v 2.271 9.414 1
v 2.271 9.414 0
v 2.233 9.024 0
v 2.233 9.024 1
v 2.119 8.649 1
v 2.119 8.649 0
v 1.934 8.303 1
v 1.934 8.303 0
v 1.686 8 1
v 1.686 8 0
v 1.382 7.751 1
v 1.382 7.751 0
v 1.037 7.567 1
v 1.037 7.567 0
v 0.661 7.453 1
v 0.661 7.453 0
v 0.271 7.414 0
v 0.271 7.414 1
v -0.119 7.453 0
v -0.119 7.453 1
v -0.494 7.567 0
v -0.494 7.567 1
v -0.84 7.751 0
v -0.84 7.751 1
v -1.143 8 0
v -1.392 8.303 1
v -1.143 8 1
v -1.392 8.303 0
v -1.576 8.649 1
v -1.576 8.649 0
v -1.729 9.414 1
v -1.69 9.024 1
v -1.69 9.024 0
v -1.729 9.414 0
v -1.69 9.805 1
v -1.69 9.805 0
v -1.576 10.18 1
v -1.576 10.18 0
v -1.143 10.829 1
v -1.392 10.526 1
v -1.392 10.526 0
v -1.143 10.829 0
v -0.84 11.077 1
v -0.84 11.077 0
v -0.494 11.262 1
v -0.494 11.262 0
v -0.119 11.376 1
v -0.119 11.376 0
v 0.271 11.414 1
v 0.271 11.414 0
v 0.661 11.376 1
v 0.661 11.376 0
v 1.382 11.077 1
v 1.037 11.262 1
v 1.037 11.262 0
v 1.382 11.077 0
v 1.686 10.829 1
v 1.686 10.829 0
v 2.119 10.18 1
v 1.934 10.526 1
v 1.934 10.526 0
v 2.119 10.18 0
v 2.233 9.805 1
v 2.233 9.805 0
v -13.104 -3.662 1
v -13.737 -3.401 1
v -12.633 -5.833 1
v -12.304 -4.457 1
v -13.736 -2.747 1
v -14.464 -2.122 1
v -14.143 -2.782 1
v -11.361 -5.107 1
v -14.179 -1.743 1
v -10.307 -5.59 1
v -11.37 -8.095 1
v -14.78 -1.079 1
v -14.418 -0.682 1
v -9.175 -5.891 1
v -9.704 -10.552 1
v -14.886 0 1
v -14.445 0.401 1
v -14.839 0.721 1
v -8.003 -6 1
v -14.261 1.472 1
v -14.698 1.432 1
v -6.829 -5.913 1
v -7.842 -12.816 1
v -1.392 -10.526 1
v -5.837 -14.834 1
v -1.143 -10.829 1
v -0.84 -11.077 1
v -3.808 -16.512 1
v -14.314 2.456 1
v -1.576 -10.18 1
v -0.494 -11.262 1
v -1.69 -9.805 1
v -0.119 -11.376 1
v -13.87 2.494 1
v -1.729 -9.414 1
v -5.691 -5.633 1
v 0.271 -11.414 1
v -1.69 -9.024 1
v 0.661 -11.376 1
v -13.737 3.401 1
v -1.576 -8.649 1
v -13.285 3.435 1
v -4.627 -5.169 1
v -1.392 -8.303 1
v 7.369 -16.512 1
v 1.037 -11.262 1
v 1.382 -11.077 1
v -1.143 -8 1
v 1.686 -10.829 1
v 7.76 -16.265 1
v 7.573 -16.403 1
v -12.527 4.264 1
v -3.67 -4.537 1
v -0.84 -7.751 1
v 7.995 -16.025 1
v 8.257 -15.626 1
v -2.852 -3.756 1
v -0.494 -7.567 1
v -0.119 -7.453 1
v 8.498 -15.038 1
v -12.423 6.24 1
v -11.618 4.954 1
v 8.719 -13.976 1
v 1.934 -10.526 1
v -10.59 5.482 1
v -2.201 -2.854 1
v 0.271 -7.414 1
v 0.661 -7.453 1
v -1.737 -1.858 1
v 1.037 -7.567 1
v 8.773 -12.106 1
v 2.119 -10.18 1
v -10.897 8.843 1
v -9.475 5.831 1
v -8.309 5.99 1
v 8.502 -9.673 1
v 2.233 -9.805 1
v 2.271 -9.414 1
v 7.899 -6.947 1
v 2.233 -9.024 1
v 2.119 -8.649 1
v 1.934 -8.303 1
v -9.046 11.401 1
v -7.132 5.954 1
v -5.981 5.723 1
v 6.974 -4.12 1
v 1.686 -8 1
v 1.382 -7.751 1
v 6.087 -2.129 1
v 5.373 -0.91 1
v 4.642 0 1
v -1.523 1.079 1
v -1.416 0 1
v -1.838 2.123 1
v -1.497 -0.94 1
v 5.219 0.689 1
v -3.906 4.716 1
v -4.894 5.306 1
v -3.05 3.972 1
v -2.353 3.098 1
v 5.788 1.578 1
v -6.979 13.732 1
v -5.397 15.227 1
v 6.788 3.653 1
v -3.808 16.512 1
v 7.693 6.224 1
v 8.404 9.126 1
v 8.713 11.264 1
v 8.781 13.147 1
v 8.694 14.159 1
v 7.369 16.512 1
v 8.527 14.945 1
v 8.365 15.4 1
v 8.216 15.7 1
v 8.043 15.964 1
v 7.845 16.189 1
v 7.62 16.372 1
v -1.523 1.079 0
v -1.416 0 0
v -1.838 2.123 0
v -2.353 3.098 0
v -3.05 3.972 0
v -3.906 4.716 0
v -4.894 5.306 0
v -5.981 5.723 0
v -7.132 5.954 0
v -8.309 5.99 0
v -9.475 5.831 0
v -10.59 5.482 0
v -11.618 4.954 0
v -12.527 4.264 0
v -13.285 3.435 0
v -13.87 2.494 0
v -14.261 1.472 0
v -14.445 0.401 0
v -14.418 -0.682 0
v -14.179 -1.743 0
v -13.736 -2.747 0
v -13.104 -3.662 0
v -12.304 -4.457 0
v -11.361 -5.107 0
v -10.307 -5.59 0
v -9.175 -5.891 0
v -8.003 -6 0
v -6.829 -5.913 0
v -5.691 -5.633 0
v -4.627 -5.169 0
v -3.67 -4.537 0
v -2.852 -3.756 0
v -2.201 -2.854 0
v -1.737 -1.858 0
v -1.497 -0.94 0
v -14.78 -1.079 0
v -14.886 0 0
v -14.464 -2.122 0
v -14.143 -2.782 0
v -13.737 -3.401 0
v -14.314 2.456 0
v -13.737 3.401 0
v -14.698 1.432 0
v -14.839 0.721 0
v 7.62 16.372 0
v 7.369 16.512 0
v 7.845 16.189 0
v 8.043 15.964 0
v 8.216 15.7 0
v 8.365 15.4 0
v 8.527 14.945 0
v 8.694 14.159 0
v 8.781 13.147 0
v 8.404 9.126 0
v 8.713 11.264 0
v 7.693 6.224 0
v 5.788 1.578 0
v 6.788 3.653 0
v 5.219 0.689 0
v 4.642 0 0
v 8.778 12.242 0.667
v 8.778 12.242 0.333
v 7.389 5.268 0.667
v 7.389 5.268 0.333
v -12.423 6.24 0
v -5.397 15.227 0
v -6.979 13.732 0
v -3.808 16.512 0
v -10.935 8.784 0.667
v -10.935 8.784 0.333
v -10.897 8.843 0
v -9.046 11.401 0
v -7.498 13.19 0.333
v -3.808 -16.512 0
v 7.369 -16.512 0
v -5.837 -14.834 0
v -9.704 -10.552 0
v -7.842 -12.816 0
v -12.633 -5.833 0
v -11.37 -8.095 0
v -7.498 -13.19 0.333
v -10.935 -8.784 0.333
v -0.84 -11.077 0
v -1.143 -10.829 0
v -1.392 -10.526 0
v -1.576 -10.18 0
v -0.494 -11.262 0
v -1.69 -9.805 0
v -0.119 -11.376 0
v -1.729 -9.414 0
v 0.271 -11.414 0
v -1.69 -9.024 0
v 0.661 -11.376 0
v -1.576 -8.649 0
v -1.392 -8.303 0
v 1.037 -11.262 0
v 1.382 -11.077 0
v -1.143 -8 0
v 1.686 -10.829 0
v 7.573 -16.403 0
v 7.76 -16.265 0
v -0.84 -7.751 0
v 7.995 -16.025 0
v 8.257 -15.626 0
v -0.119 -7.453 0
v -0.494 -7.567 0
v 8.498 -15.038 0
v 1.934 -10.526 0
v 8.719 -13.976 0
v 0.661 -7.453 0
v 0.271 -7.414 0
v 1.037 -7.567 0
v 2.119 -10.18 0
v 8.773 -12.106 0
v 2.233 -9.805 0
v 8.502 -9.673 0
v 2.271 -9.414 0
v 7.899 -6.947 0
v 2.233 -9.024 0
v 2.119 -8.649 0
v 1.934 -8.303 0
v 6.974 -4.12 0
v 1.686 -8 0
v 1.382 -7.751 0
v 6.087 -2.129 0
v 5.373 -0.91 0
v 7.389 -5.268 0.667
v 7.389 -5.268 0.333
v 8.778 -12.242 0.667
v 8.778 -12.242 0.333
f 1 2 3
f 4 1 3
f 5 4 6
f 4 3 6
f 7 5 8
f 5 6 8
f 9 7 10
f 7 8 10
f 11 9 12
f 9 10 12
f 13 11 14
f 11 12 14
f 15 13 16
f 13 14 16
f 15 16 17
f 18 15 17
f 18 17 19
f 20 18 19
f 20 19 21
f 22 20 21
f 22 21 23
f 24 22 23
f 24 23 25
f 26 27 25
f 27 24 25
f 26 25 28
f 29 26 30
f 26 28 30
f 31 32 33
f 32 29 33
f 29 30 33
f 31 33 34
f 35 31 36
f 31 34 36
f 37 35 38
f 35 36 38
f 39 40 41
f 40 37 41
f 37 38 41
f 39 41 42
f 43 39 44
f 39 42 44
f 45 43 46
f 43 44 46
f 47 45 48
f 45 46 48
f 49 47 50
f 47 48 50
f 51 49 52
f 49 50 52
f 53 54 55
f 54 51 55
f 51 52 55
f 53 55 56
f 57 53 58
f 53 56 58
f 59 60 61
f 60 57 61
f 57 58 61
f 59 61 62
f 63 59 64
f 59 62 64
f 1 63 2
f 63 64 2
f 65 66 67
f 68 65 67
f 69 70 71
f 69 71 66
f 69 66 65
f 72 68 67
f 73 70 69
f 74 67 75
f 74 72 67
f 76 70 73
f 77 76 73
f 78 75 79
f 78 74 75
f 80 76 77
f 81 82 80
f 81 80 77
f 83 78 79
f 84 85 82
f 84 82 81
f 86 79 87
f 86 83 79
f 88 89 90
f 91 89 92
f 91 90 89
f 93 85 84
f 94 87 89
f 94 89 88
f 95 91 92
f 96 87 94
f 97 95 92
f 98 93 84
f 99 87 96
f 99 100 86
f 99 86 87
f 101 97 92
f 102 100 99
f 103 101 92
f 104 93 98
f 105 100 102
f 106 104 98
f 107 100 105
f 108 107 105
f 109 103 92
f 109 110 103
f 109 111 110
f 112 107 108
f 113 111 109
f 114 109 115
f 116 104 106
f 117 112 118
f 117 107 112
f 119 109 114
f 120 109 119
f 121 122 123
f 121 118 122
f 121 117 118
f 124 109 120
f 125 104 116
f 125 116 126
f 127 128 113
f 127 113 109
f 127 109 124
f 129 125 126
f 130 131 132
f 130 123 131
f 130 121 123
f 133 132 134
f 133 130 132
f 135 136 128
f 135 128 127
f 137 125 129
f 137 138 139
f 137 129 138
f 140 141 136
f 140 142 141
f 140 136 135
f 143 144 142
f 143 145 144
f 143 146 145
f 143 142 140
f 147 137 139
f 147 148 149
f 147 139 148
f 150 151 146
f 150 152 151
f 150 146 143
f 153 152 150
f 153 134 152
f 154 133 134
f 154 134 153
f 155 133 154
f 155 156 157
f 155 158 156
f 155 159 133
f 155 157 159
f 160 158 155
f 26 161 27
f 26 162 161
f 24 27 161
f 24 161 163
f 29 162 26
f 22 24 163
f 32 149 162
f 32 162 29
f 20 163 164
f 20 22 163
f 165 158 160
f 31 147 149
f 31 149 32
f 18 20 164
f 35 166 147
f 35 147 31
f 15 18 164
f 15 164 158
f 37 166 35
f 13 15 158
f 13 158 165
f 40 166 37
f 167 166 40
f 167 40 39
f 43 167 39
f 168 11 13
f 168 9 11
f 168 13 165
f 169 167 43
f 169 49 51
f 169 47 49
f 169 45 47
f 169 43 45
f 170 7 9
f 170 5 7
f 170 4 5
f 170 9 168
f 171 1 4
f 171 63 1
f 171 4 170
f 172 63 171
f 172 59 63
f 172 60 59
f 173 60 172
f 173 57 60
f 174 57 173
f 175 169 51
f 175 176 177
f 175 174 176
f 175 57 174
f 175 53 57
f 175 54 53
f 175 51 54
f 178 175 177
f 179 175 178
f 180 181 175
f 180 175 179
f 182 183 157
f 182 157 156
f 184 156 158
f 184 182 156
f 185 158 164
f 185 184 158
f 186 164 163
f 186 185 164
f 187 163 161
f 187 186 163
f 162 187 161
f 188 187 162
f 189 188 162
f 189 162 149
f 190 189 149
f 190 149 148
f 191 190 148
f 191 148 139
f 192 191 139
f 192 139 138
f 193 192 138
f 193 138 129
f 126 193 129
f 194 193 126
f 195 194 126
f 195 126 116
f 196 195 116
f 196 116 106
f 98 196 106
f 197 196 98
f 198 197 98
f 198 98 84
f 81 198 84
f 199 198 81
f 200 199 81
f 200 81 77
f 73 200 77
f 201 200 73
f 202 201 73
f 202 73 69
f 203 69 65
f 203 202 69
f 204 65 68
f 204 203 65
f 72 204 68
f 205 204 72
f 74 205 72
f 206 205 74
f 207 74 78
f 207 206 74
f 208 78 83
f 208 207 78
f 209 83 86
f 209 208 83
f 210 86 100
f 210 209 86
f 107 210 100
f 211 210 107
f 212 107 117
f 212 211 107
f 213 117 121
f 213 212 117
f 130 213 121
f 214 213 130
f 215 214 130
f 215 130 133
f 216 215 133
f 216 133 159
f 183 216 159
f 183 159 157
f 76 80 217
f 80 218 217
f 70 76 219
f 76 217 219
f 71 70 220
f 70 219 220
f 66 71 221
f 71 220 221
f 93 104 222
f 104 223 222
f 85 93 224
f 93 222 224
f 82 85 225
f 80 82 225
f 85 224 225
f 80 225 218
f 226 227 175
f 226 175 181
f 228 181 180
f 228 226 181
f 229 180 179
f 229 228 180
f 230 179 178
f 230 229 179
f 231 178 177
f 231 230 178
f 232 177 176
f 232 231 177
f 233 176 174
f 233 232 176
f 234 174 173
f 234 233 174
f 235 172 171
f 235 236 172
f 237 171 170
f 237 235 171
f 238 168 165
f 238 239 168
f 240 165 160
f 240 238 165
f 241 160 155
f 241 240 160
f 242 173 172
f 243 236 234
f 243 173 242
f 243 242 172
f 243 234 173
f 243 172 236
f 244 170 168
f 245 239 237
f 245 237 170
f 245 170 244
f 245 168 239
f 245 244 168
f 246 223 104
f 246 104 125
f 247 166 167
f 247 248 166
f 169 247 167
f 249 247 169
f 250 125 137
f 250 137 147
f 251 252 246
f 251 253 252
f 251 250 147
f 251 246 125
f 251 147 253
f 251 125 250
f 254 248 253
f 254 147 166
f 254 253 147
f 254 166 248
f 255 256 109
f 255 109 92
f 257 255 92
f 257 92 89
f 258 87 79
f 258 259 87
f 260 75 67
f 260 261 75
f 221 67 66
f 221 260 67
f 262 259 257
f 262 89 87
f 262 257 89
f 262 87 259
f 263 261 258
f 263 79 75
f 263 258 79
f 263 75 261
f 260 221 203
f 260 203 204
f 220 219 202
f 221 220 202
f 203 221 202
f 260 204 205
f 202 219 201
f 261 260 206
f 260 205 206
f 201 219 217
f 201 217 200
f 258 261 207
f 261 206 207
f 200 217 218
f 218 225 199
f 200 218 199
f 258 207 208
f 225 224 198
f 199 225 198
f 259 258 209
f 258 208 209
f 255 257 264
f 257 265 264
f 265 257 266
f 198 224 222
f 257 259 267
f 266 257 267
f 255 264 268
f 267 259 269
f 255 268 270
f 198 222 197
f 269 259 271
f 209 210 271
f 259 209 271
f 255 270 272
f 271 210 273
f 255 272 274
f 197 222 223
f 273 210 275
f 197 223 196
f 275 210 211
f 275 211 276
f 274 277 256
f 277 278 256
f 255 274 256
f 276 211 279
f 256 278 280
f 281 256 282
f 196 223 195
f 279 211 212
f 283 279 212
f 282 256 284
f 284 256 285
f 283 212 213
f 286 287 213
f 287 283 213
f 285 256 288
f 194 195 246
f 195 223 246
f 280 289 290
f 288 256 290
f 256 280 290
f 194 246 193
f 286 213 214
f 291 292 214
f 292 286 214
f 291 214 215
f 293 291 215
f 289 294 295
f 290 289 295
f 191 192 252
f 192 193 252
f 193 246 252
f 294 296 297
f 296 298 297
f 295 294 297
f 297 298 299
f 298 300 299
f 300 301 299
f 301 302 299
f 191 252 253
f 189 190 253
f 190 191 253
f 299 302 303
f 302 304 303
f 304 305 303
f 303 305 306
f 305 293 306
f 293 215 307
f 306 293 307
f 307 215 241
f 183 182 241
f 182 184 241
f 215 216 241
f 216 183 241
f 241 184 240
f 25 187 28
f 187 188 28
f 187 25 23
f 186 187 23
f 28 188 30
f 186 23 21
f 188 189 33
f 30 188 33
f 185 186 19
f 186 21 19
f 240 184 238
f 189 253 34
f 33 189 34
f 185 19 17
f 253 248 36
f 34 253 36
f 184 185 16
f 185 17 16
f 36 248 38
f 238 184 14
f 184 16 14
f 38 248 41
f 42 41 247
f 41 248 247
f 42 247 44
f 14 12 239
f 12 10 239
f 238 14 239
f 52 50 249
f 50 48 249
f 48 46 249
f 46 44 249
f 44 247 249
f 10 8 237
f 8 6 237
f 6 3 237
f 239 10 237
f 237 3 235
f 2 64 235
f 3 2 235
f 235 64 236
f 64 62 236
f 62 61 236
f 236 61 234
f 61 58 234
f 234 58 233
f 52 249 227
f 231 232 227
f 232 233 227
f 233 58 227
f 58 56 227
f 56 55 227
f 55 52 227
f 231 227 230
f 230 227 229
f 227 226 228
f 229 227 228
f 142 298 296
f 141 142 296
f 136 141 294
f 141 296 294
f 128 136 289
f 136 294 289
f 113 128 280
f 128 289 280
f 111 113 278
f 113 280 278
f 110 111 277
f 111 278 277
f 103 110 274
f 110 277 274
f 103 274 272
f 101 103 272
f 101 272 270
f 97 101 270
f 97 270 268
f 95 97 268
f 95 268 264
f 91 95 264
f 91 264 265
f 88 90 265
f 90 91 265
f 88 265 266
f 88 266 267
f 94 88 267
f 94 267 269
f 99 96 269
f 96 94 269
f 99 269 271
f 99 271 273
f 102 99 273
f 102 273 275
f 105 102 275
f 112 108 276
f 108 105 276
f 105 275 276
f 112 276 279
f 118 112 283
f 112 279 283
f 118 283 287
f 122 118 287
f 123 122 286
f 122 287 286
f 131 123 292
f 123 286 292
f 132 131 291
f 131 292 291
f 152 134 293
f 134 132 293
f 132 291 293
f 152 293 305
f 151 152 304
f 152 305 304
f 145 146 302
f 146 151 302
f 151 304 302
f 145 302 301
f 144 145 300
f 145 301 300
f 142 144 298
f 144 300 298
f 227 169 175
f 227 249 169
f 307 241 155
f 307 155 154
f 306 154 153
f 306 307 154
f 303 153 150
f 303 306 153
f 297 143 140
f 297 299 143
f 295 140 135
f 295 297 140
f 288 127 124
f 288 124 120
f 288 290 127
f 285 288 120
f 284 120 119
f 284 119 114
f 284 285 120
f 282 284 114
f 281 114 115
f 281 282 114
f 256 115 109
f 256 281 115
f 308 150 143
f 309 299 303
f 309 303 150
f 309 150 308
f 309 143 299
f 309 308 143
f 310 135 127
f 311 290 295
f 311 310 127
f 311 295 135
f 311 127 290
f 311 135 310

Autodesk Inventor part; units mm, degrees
ref_plane "YZ Plane" through (0, 0, 0) normal (1, 0, 0) x (0, 1, 0)
ref_plane "XZ Plane" through (0, 0, 0) normal (0, 1, 0) x (-1, 0, 0)
ref_plane "XY Plane" through (0, 0, 0) normal (0, 0, 1) x (1, 0, 0)
sketch "Szkic1" plane through (0, 0, 0) normal (0, 0, 1) x (1, 0, 0)
  circle A0 centre (0.2713, 9.4144) radius 2 projected
  circle A1 centre (0.2713, -9.4144) radius 2 projected
  ellipse E0 centre (-8.3642, 0) end of major axis (-1.8423, 0) minor radius 6 (-14.886, 0) -> (-13.7374, -3.4005) ccw projected
  spline S0 degree 3 poles (-3.8083, -16.5118) (-7.4967, -13.768) (-11.3809, -9.2364) (-13.7374, -3.4005) knots 1 1 1 1 1.842723 1.842723 1.842723 1.842723 projected
  line L0 (7.3687, -16.5118) -> (-3.8083, -16.5118) projected
  spline S1 degree 3 poles (4.6424, 0) (7.5886, -2.9462) (10.6572, -15.0638) (7.3687, -16.5118) knots 1 1 1 1 2 2 2 2 projected
  spline S2 degree 3 poles (7.3687, 16.5118) (10.6572, 15.0638) (7.5886, 2.9462) (4.6424, 0) knots 1 1 1 1 2 2 2 2 projected
  line L1 (-3.8083, 16.5118) -> (7.3687, 16.5118) projected
  spline S3 degree 3 poles (-13.7374, 3.4005) (-11.3809, 9.2364) (-7.4967, 13.768) (-3.8083, 16.5118) knots 1.157277 1.157277 1.157277 1.157277 2 2 2 2 projected
  ellipse E1 centre (-8.3642, 0) end of major axis (-1.8423, 0) minor radius 6 (-13.7374, 3.4005) -> (-14.886, 0) ccw projected
  ellipse E2 centre (-7.9381, 0) end of major axis (-1.4162, 0) minor radius 6 projected
  point P0 (0, 0)
extrude "Wyciągnięcie proste1" add sketch "Szkic1" along normal blind 1
properties part number "mocowanie_podwozia_gora"
